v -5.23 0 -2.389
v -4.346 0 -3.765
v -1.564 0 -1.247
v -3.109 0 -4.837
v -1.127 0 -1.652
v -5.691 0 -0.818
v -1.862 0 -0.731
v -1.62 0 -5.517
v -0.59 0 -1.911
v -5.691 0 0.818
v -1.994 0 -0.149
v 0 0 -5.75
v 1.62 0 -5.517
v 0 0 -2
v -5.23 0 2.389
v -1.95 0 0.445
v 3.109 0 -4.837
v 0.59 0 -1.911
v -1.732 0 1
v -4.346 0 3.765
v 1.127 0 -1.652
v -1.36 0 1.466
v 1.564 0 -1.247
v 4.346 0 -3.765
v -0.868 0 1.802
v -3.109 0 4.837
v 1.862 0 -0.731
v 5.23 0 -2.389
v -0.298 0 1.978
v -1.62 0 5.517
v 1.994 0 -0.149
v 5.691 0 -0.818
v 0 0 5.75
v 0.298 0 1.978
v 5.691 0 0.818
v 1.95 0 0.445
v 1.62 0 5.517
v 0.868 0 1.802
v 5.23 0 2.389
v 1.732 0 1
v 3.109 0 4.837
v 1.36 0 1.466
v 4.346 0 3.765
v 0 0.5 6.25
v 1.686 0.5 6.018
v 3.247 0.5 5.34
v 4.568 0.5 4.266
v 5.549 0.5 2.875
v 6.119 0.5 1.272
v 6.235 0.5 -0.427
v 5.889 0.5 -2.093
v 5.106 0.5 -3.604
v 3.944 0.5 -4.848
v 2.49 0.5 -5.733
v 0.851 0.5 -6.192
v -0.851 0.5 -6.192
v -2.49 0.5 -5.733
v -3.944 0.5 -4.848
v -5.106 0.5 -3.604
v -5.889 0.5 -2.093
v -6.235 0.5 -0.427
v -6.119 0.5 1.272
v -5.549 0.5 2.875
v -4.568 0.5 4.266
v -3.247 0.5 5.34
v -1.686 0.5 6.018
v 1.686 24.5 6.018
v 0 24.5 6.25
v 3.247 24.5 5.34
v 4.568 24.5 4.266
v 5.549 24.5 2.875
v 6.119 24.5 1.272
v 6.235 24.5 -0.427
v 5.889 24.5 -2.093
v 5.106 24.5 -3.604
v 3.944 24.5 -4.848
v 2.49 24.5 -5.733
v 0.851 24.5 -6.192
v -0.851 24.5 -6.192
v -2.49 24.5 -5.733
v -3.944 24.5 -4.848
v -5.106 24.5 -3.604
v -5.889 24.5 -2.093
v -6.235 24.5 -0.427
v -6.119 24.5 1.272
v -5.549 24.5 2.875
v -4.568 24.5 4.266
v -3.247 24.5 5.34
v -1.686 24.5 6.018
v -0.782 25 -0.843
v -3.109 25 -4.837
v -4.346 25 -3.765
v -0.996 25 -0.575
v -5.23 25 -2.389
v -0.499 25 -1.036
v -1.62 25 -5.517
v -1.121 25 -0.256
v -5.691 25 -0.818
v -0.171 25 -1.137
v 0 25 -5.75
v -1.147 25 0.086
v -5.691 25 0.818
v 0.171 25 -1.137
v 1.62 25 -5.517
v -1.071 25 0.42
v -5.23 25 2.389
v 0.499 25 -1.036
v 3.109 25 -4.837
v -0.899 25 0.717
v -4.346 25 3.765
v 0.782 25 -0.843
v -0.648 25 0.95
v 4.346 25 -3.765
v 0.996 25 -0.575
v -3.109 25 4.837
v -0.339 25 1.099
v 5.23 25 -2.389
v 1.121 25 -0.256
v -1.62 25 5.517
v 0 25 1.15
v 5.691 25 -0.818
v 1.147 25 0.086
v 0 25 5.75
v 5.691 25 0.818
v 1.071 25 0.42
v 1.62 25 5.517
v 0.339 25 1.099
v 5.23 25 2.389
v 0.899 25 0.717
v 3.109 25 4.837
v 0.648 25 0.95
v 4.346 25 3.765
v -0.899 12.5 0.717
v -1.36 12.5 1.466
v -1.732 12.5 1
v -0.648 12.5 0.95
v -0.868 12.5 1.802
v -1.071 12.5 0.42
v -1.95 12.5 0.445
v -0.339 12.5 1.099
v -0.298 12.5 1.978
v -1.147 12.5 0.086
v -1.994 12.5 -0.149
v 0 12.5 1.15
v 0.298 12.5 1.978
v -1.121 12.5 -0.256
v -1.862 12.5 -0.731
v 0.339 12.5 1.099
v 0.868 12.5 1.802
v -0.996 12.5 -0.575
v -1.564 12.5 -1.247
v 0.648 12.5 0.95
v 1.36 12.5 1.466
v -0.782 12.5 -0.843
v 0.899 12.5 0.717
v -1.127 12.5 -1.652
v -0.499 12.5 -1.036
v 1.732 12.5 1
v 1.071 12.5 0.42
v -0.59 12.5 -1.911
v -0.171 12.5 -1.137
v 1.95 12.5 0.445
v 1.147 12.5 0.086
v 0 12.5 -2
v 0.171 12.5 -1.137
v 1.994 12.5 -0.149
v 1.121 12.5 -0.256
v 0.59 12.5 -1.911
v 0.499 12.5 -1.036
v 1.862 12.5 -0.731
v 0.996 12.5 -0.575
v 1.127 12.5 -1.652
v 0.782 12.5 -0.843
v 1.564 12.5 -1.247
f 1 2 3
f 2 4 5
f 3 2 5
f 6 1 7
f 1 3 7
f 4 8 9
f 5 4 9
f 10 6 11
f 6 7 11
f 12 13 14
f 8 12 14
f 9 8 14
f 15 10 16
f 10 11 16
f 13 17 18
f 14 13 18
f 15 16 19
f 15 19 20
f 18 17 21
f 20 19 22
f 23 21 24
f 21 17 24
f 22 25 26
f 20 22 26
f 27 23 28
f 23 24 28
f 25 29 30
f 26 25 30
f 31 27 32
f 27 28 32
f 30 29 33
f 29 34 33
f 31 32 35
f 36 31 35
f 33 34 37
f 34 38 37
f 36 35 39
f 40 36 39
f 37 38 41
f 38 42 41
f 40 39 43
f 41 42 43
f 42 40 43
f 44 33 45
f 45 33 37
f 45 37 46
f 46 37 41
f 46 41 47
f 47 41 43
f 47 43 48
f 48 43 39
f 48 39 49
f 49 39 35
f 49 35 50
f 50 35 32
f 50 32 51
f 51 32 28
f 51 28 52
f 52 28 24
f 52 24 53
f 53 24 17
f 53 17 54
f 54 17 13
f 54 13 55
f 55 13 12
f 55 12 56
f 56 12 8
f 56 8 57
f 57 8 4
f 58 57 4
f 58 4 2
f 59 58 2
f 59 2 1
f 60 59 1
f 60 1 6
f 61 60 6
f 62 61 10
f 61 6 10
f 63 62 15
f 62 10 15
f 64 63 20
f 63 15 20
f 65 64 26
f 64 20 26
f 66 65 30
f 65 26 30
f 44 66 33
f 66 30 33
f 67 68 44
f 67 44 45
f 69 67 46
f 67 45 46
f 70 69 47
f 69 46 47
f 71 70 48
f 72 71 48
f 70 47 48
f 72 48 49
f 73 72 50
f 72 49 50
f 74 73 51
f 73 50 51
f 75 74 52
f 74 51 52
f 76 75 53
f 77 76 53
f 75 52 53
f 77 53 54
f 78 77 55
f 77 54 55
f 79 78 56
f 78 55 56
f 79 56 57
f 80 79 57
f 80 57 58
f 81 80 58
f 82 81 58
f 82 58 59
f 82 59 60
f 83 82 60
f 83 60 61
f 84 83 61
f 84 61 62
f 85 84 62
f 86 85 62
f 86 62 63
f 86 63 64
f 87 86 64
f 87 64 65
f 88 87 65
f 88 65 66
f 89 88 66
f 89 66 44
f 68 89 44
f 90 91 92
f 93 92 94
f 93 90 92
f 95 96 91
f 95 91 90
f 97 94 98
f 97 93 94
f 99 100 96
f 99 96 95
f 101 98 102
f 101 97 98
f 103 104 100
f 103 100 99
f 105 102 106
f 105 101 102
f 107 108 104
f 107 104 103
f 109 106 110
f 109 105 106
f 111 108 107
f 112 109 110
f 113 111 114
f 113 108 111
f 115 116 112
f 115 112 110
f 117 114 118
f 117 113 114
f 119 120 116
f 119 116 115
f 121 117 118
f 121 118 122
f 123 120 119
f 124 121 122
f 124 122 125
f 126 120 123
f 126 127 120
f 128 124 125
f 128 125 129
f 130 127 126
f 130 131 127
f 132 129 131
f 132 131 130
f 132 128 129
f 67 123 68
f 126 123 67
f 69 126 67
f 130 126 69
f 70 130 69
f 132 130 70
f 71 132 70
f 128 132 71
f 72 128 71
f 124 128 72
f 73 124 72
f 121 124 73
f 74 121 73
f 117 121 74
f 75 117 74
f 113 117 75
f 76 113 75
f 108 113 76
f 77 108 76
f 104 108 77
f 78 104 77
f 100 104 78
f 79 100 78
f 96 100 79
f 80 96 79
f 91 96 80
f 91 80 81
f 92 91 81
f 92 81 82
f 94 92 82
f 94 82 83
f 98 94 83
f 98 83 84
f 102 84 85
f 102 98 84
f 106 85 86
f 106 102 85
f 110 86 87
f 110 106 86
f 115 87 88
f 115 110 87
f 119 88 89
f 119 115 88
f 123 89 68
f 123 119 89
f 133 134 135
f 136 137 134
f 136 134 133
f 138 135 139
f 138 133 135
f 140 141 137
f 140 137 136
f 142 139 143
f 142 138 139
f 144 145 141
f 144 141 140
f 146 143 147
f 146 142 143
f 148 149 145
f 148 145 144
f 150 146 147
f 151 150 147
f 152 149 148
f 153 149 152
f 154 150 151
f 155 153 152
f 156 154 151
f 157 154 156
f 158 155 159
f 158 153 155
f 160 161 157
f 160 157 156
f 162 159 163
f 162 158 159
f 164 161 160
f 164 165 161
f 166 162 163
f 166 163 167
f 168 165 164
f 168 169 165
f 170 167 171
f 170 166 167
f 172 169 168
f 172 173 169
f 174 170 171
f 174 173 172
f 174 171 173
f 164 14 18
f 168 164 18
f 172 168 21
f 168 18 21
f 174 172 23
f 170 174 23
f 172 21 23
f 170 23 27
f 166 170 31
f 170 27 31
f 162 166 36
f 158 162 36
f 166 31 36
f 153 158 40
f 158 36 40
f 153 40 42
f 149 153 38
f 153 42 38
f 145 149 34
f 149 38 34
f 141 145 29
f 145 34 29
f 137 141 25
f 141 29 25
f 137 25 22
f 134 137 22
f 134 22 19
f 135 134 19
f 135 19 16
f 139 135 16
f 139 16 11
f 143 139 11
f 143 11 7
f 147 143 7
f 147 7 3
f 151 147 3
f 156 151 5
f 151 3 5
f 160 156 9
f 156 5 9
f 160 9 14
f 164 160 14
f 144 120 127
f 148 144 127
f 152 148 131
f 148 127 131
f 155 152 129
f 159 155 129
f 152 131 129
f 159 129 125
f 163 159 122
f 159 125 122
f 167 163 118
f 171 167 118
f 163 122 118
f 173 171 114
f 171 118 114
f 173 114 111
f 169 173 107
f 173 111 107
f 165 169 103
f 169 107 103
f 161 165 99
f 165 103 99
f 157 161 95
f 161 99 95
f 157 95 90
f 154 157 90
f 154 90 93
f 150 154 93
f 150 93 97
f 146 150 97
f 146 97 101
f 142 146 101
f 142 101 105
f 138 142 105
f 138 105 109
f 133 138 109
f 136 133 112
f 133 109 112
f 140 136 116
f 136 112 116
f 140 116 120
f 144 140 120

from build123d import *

# Parameters (mm, degrees)
SKETCH2_R           = 6.25
BOSS_EXTRUDE1_DEPTH = 9
SKETCH3_R           = 6.25
BOSS_EXTRUDE2_DEPTH = 7
SKETCH4_R           = 6.25
BOSS_EXTRUDE3_DEPTH = 9
SKETCH5_R           = 2
CUT_EXTRUDE1_DEPTH  = 12.5
SKETCH6_R           = 1.15
CUT_EXTRUDE2_DEPTH  = 12.5
CHAMFER2_SIZE       = 0.5


with BuildPart() as part:
    # Sketch2 → Boss-Extrude1 (new body)
    with BuildSketch(Plane(origin=(0, 0, 0), x_dir=(1, 0, 0), z_dir=(0, 1, 0))):
        with Locations(Location((0, 0, 0), (0, 0, 270))):
            Circle(SKETCH2_R)
    extrude(amount=BOSS_EXTRUDE1_DEPTH)

    # Sketch3 → Boss-Extrude2 (add)
    with BuildSketch(Plane(origin=(0, 9, 0), x_dir=(1, 0, 0), z_dir=(0, 1, 0))):
        with Locations(Location((0, 0, 0), (0, 0, 270))):
            Circle(SKETCH3_R)
    extrude(amount=BOSS_EXTRUDE2_DEPTH)

    # Sketch4 → Boss-Extrude3 (add)
    with BuildSketch(Plane(origin=(0, 16, 0), x_dir=(1, 0, 0), z_dir=(0, 1, 0))):
        with Locations(Location((0, 0, 0), (0, 0, 270))):
            Circle(SKETCH4_R)
    extrude(amount=BOSS_EXTRUDE3_DEPTH)

    # Sketch5 → Cut-Extrude1 (cut)
    with BuildSketch(Plane.XZ):
        with Locations(Location((0, 0, 0), (0, 0, 270))):
            Circle(SKETCH5_R)
    extrude(amount=-CUT_EXTRUDE1_DEPTH, mode=Mode.SUBTRACT)

    # Sketch6 → Cut-Extrude2 (cut)
    with BuildSketch(Plane(origin=(0, 25, 0), x_dir=(1, 0, 0), z_dir=(0, 1, 0))):
        with Locations(Location((0, 0, 0), (0, 0, 270))):
            Circle(SKETCH6_R)
    extrude(amount=-CUT_EXTRUDE2_DEPTH, mode=Mode.SUBTRACT)

    # Chamfer2
    chamfer2_edges = [part.edges().sort_by_distance(p)[0] for p in [
        (0, 25, -6.25),
        (0, 0, -6.25),
    ]]
    chamfer(chamfer2_edges, length=CHAMFER2_SIZE)


solid = part.part
